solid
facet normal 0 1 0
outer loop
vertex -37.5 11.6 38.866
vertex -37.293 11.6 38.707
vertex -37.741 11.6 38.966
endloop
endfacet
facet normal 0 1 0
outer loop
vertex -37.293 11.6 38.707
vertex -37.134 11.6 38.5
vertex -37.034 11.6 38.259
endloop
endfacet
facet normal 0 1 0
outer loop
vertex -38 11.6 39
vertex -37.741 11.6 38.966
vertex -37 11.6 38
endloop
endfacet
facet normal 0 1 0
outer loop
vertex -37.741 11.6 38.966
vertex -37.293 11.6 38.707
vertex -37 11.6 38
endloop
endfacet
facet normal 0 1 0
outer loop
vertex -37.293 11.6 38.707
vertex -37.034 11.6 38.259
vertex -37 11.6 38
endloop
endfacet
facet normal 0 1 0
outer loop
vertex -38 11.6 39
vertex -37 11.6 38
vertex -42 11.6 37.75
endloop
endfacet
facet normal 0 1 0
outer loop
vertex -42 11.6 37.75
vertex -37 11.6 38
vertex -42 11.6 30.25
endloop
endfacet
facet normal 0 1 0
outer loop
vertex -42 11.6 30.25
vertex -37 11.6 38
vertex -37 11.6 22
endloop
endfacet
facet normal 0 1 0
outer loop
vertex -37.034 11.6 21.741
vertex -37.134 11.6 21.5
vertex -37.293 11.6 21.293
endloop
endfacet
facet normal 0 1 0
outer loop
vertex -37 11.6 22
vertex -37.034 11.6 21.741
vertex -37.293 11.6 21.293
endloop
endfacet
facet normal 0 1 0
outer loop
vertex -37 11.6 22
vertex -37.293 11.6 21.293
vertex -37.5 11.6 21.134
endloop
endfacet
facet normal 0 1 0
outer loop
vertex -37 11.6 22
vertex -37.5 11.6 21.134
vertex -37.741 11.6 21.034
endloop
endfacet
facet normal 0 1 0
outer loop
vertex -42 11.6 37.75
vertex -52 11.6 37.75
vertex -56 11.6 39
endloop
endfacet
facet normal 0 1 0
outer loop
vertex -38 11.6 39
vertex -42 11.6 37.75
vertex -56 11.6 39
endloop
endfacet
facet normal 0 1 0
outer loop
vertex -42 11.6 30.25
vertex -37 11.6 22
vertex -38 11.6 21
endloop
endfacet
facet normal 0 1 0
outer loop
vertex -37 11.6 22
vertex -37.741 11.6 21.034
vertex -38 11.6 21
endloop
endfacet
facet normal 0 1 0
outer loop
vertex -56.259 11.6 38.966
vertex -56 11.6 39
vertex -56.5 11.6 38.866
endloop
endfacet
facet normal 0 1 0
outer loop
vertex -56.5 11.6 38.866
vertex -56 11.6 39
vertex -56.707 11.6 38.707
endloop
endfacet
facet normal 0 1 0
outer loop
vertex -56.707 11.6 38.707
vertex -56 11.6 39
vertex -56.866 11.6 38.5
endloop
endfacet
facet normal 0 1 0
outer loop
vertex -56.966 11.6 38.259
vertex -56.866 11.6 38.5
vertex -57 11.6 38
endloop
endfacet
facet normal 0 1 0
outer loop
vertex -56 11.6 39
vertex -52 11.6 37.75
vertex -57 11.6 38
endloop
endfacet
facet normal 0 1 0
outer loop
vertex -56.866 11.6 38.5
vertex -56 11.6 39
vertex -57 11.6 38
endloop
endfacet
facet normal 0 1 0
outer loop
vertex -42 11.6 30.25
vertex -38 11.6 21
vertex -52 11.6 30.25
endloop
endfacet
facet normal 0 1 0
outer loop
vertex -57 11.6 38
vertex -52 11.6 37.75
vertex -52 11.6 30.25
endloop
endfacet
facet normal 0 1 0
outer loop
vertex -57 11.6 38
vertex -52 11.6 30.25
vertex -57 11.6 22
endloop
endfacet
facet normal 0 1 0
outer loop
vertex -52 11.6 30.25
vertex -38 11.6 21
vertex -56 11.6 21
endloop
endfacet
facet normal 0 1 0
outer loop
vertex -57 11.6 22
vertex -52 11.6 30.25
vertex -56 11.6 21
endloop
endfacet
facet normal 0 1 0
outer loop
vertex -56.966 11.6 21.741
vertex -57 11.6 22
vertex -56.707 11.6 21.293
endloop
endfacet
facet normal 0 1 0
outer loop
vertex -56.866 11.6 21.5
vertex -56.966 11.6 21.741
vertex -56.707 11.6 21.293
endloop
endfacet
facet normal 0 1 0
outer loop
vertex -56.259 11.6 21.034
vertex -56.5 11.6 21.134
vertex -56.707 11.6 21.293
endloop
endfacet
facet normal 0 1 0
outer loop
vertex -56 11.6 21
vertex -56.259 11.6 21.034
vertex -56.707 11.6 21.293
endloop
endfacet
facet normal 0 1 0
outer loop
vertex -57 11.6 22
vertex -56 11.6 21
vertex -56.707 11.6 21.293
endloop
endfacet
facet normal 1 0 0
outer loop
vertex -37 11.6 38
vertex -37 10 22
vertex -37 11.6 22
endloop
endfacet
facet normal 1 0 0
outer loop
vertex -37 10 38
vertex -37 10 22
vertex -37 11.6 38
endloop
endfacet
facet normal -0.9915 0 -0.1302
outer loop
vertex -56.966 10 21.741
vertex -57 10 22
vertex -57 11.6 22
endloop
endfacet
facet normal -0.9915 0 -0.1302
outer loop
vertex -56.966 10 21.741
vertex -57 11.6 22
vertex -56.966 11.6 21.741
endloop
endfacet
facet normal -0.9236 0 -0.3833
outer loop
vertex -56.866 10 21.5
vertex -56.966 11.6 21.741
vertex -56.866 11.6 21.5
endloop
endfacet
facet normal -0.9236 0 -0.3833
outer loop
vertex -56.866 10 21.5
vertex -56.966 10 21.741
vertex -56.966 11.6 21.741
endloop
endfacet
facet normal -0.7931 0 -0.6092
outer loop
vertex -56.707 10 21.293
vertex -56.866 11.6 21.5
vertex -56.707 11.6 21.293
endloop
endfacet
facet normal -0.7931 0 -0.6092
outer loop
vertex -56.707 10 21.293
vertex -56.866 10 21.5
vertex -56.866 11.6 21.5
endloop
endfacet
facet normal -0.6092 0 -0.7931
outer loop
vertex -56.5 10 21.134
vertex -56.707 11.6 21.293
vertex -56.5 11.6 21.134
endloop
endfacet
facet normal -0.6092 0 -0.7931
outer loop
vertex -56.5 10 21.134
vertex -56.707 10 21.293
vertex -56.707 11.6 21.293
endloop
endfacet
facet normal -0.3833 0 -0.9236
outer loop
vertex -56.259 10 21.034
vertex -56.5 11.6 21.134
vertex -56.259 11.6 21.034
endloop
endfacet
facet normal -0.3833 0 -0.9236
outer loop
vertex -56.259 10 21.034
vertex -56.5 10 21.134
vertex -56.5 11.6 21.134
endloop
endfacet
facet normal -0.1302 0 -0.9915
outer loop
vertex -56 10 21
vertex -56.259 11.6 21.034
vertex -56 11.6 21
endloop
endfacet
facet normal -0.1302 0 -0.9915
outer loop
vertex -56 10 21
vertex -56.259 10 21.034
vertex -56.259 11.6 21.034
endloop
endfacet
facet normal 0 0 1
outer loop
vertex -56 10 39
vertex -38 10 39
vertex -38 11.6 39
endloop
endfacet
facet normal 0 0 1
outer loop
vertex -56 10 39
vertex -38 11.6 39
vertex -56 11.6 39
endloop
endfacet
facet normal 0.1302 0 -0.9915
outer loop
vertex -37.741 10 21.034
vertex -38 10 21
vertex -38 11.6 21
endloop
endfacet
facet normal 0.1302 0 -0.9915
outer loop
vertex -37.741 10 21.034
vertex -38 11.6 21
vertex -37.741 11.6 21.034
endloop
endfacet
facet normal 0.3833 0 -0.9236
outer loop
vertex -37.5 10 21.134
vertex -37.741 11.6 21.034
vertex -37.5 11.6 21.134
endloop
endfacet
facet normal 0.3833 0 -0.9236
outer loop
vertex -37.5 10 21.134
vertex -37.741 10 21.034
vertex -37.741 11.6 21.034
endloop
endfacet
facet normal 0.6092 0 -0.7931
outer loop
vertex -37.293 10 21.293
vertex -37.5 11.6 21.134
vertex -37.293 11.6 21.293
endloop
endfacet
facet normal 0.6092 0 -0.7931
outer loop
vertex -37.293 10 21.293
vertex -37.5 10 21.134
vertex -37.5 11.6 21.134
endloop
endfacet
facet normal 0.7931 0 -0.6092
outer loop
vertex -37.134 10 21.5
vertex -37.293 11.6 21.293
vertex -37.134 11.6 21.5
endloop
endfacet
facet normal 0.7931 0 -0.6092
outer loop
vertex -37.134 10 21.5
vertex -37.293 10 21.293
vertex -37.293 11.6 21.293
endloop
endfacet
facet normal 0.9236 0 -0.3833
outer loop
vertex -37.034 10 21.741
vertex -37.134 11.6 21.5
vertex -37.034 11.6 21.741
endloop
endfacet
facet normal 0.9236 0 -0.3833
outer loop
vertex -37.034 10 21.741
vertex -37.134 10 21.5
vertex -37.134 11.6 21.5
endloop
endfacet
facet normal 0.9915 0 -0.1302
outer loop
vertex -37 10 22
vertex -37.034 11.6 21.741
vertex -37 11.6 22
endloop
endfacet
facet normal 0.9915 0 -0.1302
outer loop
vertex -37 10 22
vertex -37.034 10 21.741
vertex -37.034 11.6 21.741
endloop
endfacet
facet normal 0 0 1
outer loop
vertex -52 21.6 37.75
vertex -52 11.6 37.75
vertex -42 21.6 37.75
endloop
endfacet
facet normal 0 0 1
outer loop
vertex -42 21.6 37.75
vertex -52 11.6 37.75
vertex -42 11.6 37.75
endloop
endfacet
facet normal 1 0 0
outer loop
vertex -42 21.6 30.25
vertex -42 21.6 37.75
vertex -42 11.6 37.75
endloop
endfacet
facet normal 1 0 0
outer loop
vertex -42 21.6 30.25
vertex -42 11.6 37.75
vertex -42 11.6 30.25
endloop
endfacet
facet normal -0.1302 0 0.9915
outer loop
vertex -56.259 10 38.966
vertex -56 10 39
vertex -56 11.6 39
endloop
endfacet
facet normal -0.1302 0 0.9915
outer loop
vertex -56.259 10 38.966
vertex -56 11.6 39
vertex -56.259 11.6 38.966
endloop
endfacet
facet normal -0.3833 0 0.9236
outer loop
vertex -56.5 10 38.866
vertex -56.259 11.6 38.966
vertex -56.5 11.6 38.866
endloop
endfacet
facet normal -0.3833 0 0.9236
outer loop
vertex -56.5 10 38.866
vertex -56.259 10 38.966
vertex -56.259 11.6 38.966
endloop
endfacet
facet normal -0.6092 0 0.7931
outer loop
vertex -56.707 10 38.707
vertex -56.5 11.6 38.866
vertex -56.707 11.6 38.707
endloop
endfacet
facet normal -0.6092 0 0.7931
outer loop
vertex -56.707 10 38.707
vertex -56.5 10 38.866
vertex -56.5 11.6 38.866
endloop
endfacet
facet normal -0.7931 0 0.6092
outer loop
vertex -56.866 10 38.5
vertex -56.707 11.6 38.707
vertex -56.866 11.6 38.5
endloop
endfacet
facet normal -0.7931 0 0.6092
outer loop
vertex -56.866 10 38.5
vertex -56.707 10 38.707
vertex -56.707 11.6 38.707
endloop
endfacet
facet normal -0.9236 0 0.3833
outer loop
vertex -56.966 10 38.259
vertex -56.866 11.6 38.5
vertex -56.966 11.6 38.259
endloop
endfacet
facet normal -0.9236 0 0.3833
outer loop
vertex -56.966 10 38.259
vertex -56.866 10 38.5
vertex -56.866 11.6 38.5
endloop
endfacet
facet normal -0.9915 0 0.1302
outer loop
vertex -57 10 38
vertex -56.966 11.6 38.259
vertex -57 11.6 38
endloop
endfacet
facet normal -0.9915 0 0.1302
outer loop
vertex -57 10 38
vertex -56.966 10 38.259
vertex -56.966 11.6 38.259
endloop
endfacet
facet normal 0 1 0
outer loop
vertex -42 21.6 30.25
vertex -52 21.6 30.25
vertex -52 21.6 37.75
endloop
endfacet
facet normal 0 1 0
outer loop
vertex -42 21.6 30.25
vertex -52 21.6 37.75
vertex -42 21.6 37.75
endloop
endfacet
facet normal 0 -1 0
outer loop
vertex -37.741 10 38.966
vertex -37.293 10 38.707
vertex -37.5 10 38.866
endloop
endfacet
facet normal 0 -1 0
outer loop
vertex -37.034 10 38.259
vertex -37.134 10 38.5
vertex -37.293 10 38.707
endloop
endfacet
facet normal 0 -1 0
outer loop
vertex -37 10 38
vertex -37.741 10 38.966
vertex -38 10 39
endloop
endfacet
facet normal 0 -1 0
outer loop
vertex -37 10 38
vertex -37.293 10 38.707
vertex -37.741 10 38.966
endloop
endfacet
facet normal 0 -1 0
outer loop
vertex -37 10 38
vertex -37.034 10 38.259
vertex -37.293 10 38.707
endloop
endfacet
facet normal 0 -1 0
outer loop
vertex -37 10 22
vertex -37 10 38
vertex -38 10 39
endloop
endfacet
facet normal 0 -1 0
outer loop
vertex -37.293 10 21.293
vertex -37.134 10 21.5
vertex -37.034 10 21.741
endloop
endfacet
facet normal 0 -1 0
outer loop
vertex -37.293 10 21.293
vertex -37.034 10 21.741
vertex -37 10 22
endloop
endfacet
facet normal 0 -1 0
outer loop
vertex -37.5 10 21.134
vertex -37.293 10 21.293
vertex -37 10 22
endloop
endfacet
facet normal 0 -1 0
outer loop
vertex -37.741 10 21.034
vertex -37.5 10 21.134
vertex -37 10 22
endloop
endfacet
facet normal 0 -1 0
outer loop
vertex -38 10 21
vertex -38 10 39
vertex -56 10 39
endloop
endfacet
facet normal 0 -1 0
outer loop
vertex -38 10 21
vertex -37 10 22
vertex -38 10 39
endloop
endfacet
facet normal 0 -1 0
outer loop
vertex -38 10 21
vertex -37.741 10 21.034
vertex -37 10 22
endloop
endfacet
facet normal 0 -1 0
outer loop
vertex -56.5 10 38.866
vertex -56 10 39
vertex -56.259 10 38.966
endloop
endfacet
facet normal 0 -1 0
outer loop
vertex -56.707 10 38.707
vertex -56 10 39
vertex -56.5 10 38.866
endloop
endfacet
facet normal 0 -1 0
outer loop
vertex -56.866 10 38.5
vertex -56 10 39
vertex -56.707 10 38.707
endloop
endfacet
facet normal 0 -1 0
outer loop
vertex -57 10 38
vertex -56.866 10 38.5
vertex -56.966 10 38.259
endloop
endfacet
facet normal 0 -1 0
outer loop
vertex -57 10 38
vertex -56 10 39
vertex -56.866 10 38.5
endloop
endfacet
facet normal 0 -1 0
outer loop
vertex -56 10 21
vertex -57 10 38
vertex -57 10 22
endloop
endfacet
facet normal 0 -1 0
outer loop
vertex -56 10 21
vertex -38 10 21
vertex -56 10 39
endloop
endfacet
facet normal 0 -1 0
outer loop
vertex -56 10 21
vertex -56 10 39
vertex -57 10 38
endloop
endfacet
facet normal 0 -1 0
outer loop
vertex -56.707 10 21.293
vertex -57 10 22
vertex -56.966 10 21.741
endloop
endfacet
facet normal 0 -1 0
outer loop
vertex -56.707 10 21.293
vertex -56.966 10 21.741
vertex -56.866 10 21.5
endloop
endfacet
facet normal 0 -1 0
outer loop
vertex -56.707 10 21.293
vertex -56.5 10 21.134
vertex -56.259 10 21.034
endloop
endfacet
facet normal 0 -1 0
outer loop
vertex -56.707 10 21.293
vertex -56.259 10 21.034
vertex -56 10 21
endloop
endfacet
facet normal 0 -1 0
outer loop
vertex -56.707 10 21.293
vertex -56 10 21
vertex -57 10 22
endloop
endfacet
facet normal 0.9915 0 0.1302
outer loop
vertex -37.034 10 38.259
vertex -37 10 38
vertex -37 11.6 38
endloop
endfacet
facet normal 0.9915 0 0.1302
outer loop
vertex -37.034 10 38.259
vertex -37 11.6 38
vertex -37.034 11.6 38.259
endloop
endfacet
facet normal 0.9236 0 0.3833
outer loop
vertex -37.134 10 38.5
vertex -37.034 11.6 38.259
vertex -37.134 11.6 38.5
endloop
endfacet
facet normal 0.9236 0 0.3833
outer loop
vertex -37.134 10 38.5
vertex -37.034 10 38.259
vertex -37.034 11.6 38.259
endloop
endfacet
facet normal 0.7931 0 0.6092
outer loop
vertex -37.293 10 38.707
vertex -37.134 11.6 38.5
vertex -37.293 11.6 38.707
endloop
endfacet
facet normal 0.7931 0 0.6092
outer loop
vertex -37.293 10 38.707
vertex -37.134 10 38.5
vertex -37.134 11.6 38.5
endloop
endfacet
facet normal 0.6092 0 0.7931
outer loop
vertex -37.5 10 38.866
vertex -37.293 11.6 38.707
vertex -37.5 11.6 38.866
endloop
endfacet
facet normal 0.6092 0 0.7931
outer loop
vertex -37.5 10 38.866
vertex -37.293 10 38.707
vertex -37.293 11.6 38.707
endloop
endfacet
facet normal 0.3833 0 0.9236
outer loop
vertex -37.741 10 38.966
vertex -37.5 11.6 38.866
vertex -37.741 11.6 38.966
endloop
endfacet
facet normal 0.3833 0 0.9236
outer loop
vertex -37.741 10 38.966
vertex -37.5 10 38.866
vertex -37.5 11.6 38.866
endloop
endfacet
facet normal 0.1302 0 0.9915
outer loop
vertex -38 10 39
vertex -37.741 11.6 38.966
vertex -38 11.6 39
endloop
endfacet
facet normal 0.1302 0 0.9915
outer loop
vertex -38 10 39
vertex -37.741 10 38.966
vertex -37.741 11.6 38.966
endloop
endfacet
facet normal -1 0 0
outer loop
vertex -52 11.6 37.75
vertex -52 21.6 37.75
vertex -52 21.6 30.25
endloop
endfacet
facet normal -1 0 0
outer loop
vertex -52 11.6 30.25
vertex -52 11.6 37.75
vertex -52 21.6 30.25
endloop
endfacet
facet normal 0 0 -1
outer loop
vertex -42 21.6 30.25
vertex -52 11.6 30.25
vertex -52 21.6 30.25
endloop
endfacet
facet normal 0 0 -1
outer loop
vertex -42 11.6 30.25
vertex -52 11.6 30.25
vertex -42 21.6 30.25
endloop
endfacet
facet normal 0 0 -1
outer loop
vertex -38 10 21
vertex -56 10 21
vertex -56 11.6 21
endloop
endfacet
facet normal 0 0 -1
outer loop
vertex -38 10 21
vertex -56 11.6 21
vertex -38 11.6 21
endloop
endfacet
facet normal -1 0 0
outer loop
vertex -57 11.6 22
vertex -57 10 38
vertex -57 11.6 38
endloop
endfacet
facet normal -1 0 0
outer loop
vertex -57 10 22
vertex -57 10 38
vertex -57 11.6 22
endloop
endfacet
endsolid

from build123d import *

# Parameters (mm, degrees)
BOARD_START    = 10
BOARD_DEPTH    = 1.6
TERMINAL_START = 11.6
SKETCH2_W      = 10
SKETCH2_H      = 7.5
TERMINAL_DEPTH = 10


with BuildPart() as part:
    # Sketch1 → Board (new body)
    with BuildSketch(Plane(origin=(0, 0, 0), x_dir=(1, 0, 0), z_dir=(0, 1, 0)).offset(BOARD_START)):
        with BuildLine():
            Line((-56, -21), (-38, -21))
            ThreePointArc((-38, -21), (-37.292893219, -21.292893219), (-37, -22))
            Line((-37, -22), (-37, -38))
            ThreePointArc((-37, -38), (-37.292893219, -38.707106781), (-38, -39))
            Line((-38, -39), (-56, -39))
            ThreePointArc((-56, -39), (-56.707106781, -38.707106781), (-57, -38))
            Line((-57, -38), (-57, -22))
            ThreePointArc((-57, -22), (-56.707106781, -21.292893219), (-56, -21))
        make_face()
    extrude(amount=BOARD_DEPTH)

    # Sketch2 → Terminal (add)
    with BuildSketch(Plane(origin=(0, 0, 0), x_dir=(1, 0, 0), z_dir=(0, 1, 0)).offset(TERMINAL_START)):
        with Locations((-47, -34)):
            Rectangle(SKETCH2_W, SKETCH2_H)
    extrude(amount=TERMINAL_DEPTH)


solid = part.part
